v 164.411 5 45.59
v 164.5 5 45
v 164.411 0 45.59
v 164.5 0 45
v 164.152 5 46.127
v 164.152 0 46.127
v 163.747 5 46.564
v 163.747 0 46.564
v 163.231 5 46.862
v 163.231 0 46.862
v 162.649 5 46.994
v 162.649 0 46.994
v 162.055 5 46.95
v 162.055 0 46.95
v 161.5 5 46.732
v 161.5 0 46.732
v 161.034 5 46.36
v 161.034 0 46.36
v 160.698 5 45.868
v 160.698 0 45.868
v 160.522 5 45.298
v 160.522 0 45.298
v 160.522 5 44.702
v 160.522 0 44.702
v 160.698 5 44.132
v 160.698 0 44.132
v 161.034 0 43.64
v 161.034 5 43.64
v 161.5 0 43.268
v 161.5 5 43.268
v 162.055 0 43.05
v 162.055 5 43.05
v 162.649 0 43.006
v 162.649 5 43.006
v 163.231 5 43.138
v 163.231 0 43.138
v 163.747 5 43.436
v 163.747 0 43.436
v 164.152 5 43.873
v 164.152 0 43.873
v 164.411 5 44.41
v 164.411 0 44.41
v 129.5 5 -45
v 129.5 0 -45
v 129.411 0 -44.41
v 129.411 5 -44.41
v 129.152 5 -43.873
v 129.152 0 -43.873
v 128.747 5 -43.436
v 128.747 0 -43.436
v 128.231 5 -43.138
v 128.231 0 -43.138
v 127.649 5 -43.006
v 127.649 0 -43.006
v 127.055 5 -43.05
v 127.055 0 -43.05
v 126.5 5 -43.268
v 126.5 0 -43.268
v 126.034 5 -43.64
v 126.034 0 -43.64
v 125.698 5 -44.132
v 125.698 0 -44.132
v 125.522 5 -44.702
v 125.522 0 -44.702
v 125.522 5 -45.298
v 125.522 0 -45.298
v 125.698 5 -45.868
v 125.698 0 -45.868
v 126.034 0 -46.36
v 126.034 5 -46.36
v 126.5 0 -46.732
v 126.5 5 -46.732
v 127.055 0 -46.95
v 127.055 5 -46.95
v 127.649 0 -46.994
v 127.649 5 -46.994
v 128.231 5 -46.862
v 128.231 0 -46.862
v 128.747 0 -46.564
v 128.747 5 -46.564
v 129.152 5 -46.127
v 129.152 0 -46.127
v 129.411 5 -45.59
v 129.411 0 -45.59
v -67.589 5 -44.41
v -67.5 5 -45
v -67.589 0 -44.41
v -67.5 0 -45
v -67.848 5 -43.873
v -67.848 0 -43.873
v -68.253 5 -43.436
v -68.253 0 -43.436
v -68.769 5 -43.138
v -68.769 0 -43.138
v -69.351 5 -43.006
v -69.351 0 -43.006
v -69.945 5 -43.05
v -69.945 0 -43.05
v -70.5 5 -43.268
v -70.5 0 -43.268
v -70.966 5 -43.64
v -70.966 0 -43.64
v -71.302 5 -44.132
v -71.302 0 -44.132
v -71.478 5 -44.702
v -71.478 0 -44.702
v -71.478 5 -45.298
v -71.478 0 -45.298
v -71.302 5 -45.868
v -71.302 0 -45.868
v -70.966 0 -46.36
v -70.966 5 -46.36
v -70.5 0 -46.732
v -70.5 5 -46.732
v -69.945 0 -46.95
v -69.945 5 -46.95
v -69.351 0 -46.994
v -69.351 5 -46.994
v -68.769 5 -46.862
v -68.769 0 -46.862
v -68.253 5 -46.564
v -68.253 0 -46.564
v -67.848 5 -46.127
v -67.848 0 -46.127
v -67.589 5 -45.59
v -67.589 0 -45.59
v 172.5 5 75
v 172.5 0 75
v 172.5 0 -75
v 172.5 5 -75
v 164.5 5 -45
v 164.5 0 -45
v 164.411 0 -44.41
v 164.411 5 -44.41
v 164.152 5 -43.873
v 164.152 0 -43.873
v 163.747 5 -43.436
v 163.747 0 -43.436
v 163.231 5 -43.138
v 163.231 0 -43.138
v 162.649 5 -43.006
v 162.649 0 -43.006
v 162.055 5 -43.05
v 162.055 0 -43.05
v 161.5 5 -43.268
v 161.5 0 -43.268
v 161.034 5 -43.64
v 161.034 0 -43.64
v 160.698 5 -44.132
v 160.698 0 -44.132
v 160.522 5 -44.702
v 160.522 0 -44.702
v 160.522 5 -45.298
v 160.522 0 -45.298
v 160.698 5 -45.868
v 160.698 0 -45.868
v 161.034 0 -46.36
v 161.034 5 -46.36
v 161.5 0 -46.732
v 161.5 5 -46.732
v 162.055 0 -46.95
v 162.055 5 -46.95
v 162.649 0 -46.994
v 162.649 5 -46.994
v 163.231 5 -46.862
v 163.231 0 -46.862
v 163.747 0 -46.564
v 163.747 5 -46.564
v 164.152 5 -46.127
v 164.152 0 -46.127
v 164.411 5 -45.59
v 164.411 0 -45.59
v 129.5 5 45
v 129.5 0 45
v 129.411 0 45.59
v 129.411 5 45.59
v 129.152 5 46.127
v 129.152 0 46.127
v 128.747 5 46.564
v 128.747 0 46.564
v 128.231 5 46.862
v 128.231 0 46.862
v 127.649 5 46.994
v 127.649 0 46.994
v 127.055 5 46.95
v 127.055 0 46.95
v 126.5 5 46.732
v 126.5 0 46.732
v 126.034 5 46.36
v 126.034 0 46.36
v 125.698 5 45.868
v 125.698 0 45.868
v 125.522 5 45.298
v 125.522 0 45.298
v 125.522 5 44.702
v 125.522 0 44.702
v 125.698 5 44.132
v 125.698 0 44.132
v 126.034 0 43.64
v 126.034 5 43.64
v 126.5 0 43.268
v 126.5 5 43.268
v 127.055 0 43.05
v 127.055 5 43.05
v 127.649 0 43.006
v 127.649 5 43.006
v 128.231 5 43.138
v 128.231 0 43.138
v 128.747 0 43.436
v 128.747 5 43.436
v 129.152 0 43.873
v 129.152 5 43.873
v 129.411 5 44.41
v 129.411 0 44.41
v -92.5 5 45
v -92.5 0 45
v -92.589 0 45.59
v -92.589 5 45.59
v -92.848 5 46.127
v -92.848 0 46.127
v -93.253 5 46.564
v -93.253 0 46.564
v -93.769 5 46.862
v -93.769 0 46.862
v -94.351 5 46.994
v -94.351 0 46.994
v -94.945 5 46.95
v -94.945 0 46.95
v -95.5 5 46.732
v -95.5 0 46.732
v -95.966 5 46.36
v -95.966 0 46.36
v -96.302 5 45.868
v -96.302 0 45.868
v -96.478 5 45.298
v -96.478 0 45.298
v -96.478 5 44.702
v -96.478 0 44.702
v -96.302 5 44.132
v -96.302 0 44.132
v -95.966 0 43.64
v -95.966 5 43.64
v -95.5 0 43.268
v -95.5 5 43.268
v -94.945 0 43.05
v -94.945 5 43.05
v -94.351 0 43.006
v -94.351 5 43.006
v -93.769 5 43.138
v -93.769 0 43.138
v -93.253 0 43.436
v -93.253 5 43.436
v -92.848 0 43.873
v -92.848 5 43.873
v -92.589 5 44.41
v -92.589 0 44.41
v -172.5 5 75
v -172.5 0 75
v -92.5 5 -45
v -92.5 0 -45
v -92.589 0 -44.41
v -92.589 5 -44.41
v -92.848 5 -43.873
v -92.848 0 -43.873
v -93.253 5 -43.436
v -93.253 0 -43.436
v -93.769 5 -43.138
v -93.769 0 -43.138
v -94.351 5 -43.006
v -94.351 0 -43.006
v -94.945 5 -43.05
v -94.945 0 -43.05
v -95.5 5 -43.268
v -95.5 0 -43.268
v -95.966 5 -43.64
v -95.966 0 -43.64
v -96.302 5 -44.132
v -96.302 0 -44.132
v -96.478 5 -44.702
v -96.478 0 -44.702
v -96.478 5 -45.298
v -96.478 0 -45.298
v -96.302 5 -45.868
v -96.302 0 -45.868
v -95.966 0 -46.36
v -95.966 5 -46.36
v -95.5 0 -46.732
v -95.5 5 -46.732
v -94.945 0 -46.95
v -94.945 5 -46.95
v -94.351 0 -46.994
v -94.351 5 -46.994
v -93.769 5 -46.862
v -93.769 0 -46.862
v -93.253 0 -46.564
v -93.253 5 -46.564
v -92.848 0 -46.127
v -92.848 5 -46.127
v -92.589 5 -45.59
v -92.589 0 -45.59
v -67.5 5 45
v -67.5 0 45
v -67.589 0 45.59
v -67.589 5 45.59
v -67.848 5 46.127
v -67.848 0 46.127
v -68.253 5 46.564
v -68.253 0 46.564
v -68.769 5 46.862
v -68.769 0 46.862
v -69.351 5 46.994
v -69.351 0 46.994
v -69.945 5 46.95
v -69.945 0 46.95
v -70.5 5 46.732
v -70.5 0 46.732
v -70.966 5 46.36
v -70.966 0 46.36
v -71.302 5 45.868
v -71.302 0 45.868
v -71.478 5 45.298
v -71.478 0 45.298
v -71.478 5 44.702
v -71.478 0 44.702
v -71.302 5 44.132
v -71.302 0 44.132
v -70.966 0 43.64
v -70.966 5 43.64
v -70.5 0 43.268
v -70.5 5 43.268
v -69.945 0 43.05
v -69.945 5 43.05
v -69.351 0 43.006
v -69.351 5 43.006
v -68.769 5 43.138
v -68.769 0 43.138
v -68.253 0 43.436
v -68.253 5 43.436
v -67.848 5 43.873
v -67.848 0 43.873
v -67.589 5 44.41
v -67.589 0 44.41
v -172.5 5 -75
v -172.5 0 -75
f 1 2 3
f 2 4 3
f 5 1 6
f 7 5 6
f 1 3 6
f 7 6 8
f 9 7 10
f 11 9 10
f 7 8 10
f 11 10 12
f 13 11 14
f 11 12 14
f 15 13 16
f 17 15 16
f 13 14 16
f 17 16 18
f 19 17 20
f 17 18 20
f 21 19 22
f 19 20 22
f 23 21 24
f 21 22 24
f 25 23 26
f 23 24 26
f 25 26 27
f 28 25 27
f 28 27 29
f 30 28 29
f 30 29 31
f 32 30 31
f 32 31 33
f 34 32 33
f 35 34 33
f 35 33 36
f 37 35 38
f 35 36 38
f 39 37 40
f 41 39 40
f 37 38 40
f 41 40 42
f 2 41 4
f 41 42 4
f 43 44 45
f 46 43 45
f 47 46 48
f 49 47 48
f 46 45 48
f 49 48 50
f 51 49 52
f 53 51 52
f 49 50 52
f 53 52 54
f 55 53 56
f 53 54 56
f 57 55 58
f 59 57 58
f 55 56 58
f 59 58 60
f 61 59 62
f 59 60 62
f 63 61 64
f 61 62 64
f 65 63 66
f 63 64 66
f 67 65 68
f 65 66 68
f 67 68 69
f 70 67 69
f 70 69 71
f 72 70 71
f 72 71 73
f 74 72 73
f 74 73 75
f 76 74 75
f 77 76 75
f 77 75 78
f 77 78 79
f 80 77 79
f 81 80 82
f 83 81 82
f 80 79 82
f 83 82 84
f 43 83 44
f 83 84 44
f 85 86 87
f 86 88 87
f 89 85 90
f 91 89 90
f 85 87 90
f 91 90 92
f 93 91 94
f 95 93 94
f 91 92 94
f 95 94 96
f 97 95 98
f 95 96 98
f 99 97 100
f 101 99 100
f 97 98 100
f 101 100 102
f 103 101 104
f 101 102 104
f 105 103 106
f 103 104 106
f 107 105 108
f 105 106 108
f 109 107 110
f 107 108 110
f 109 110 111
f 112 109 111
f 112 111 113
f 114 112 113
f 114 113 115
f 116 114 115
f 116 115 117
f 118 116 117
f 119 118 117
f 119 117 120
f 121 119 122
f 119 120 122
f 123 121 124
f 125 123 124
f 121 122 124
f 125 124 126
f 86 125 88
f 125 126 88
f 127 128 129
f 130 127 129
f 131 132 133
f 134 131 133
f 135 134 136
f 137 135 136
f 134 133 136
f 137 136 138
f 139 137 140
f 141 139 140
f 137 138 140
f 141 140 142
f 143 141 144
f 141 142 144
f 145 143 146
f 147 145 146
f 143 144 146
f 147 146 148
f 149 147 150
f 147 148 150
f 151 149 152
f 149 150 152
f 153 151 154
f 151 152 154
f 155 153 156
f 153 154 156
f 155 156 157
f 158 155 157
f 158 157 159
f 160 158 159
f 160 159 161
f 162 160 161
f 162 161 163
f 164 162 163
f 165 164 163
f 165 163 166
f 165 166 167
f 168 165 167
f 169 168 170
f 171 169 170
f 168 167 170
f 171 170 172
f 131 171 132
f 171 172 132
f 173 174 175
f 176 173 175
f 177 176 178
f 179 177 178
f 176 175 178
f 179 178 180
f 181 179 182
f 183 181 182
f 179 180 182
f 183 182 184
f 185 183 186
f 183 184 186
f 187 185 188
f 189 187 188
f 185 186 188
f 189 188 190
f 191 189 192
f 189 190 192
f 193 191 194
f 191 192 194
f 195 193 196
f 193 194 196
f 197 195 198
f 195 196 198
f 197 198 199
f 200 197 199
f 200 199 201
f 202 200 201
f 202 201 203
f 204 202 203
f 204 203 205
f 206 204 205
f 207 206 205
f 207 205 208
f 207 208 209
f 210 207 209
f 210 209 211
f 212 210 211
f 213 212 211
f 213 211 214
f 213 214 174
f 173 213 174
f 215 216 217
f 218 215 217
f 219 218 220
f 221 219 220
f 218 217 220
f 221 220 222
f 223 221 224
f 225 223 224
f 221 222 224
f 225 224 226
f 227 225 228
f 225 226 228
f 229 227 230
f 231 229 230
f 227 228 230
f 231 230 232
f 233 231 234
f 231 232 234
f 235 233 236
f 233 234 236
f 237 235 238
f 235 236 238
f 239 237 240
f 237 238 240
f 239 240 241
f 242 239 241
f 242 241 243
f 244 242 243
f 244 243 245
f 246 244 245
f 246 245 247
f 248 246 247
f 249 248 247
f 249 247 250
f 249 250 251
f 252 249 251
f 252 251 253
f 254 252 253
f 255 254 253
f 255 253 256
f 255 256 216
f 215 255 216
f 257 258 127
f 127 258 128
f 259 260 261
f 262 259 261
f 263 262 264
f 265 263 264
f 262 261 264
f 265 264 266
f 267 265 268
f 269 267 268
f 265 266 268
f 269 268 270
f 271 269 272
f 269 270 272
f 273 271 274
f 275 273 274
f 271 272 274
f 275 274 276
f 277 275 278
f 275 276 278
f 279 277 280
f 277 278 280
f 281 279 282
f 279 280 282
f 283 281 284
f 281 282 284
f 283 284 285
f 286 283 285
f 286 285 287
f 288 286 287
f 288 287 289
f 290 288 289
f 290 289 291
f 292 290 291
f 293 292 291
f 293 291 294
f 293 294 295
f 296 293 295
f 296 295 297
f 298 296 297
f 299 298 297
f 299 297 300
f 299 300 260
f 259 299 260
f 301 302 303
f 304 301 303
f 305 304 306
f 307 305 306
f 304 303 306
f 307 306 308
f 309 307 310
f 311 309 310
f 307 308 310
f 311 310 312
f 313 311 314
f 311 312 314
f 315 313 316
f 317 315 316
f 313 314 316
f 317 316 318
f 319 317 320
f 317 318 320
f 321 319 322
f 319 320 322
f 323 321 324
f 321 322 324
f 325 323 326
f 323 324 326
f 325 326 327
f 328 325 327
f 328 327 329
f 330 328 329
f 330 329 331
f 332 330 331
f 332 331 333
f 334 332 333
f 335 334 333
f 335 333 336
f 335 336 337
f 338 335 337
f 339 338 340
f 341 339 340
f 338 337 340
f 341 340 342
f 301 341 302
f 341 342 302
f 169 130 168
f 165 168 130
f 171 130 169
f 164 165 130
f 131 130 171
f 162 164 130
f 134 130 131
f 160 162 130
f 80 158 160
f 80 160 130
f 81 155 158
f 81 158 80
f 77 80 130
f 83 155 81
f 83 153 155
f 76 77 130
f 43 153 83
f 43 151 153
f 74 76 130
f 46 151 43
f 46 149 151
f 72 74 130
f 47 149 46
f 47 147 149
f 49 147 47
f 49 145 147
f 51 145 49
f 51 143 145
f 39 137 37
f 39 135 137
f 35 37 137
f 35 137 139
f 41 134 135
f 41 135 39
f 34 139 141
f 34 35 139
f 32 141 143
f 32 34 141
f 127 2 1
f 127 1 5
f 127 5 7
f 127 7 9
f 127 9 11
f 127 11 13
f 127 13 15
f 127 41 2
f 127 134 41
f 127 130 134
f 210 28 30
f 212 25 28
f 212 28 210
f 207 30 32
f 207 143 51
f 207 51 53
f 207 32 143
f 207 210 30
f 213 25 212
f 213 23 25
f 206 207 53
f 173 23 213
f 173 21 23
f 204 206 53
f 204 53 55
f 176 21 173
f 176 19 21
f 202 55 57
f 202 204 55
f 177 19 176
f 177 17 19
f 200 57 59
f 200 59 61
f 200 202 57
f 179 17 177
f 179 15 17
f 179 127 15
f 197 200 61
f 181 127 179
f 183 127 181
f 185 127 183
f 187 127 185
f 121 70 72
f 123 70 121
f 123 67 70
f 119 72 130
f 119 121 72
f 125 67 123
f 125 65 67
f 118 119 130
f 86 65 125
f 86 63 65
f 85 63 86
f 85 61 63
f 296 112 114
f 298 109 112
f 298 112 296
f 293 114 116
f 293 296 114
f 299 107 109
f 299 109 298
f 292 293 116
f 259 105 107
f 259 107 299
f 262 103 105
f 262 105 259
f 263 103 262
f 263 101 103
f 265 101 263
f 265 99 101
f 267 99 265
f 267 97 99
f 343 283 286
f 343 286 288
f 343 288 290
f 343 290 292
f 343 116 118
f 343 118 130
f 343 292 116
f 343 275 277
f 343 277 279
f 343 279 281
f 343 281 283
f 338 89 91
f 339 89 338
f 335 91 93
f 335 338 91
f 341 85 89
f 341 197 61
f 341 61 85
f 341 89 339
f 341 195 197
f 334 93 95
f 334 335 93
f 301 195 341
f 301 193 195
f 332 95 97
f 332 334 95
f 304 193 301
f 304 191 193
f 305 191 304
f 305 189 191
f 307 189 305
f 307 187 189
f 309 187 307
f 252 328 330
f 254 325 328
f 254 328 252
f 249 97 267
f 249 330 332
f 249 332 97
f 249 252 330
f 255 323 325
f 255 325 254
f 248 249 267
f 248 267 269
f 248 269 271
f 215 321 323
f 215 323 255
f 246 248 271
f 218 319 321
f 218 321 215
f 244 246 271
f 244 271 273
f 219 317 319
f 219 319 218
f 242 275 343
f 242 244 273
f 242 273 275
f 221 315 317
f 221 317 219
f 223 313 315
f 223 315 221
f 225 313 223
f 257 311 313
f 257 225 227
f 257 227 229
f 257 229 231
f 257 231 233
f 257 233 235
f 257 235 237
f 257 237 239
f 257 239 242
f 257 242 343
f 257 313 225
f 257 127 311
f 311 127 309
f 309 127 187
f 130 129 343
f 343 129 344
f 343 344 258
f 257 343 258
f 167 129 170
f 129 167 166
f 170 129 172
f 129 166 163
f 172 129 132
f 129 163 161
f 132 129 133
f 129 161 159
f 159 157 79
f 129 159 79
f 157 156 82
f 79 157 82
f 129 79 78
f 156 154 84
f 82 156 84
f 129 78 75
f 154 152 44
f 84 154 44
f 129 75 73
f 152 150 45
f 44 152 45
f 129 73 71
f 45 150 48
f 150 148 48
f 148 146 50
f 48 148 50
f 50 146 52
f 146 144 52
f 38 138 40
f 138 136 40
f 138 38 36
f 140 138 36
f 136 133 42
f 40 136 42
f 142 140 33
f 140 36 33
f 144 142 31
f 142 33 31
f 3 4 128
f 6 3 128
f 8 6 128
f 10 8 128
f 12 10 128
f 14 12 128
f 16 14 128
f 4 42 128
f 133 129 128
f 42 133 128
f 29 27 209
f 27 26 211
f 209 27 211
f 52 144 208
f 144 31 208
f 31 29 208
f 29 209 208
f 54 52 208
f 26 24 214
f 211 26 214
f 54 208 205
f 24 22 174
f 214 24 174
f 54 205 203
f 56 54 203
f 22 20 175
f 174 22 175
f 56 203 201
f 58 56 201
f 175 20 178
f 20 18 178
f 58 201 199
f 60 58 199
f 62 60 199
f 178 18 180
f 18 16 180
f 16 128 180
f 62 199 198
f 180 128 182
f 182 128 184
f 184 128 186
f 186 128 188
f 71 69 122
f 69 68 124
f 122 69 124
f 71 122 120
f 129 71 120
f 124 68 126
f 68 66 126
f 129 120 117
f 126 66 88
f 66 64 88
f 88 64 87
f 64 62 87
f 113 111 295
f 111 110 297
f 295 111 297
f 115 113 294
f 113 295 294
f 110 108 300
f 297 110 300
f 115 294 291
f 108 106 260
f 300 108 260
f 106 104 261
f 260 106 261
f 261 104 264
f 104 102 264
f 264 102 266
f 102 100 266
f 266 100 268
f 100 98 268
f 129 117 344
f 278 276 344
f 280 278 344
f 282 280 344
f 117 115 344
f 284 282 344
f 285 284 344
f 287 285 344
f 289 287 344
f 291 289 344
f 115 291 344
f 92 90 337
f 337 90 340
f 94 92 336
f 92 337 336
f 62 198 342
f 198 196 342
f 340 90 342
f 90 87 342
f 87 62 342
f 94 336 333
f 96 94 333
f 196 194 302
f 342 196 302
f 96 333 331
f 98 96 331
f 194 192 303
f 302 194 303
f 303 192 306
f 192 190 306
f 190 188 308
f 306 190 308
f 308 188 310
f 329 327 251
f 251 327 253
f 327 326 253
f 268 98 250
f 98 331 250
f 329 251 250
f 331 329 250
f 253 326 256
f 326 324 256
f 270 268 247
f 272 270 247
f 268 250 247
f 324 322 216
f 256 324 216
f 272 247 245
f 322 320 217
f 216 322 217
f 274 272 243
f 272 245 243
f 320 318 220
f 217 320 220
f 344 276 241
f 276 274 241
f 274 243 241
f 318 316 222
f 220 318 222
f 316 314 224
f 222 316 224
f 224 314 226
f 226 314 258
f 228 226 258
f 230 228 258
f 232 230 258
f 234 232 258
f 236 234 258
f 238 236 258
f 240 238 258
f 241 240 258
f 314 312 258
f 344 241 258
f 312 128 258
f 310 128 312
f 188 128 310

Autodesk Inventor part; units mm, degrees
ref_plane "YZ Plane" through (0, 0, 0) normal (1, 0, 0) x (0, 1, 0)
ref_plane "XZ Plane" through (0, 0, 0) normal (0, 1, 0) x (-1, 0, 0)
ref_plane "XY Plane" through (0, 0, 0) normal (0, 0, 1) x (1, 0, 0)
sketch "Sketch1" plane through (0, 0, 0) normal (0, 1, 0) x (-1, 0, 0)
  line L0 (172.5, 75) -> (-172.5, 75)
  line L1 (-172.5, 75) -> (-172.5, -75)
  line L2 (-172.5, -75) -> (172.5, -75)
  line L3 (172.5, -75) -> (172.5, 75)
  line L4 (172.5, 75) -> (-172.5, -75) construction
  line L5 (-172.5, 75) -> (172.5, -75) construction
  point P0 (0, 0)
  dimension "d0" = 345
  dimension "d1" = 150
extrude "Extrusion1" add sketch "Sketch1" along normal blind 5
sketch "Sketch2" plane through (0, 0, 0) normal (0, -1, 0) x (1, 0, 0)
  circle A0 centre (162.5, 45) radius 2.05 projected
  circle A1 centre (162.5, -45) radius 2.05 projected
  circle A2 centre (127.5, 45) radius 2.05 projected
  circle A3 centre (127.5, -45) radius 2.05 projected
  line L0 (172.5, -75) -> (47.5, -75) projected
  line L1 (47.5, -75) -> (47.5, -55) projected
  line L2 (117.5, -55) -> (47.5, -55) projected
  line L3 (117.5, -55) -> (117.5, 75) projected
  line L4 (117.5, 75) -> (172.5, 75) projected
  line L5 (172.5, -75) -> (172.5, 75) projected
  line L6 (-104.55, -45) -> (-104.55, 60) projected
  line L7 (-104.55, 60) -> (-132, 60) projected
  line L8 (-132, 75) -> (-132, 60) projected
  line L9 (-132, 75) -> (-32, 75) projected
  line L10 (-32, 60) -> (-32, 75) projected
  line L11 (-32, 60) -> (-59.45, 60) projected
  line L12 (-59.45, 60) -> (-59.45, -45) projected
  arc A4 (-59.45, -45) -> (-54.45, -50) centre (-54.45, -45) ccw projected
  line L13 (-32, -50) -> (-54.45, -50) projected
  line L14 (-32, -75) -> (-32, -50) projected
  line L15 (-59.45, -75) -> (-32, -75) projected
  line L16 (-59.45, -75) -> (-59.45, -65) projected
  line L17 (-59.45, -65) -> (-104.55, -65) projected
  line L18 (-104.55, -65) -> (-104.55, -75) projected
  line L19 (-132, -75) -> (-104.55, -75) projected
  line L20 (-132, -50) -> (-132, -75) projected
  line L21 (-109.55, -50) -> (-132, -50) projected
  arc A5 (-109.55, -50) -> (-104.55, -45) centre (-109.55, -45) ccw projected
  circle A6 centre (-94.5, 45) radius 2.05 projected
  circle A7 centre (-69.5, -45) radius 2.05 projected
  circle A8 centre (-69.5, 45) radius 2.05 projected
  circle A9 centre (-94.5, -45) radius 2.05 projected
  circle A10 centre (162.5, 45) radius 2
  circle A11 centre (162.5, -45) radius 2
  circle A12 centre (127.5, 45) radius 2
  circle A13 centre (127.5, -45) radius 2
  circle A14 centre (-69.5, 45) radius 2
  circle A15 centre (-69.5, -45) radius 2
  circle A16 centre (-94.5, 45) radius 2
  circle A17 centre (-94.5, -45) radius 2
  point P0 (0, 0)
  dimension "d4" = 4
  dimension "d5" = 4
  dimension "d6" = 4
  dimension "d7" = 4
  dimension "d8" = 4
  dimension "d9" = 4
  dimension "d10" = 4
  dimension "d11" = 4
extrude "Extrusion2" cut sketch "Sketch2" against normal blind 5 contours A10 | A11 | A12 | A13 | A14 | A15 | A16 | A17
properties part number "acrylic_side" material "ABS Plastic"
